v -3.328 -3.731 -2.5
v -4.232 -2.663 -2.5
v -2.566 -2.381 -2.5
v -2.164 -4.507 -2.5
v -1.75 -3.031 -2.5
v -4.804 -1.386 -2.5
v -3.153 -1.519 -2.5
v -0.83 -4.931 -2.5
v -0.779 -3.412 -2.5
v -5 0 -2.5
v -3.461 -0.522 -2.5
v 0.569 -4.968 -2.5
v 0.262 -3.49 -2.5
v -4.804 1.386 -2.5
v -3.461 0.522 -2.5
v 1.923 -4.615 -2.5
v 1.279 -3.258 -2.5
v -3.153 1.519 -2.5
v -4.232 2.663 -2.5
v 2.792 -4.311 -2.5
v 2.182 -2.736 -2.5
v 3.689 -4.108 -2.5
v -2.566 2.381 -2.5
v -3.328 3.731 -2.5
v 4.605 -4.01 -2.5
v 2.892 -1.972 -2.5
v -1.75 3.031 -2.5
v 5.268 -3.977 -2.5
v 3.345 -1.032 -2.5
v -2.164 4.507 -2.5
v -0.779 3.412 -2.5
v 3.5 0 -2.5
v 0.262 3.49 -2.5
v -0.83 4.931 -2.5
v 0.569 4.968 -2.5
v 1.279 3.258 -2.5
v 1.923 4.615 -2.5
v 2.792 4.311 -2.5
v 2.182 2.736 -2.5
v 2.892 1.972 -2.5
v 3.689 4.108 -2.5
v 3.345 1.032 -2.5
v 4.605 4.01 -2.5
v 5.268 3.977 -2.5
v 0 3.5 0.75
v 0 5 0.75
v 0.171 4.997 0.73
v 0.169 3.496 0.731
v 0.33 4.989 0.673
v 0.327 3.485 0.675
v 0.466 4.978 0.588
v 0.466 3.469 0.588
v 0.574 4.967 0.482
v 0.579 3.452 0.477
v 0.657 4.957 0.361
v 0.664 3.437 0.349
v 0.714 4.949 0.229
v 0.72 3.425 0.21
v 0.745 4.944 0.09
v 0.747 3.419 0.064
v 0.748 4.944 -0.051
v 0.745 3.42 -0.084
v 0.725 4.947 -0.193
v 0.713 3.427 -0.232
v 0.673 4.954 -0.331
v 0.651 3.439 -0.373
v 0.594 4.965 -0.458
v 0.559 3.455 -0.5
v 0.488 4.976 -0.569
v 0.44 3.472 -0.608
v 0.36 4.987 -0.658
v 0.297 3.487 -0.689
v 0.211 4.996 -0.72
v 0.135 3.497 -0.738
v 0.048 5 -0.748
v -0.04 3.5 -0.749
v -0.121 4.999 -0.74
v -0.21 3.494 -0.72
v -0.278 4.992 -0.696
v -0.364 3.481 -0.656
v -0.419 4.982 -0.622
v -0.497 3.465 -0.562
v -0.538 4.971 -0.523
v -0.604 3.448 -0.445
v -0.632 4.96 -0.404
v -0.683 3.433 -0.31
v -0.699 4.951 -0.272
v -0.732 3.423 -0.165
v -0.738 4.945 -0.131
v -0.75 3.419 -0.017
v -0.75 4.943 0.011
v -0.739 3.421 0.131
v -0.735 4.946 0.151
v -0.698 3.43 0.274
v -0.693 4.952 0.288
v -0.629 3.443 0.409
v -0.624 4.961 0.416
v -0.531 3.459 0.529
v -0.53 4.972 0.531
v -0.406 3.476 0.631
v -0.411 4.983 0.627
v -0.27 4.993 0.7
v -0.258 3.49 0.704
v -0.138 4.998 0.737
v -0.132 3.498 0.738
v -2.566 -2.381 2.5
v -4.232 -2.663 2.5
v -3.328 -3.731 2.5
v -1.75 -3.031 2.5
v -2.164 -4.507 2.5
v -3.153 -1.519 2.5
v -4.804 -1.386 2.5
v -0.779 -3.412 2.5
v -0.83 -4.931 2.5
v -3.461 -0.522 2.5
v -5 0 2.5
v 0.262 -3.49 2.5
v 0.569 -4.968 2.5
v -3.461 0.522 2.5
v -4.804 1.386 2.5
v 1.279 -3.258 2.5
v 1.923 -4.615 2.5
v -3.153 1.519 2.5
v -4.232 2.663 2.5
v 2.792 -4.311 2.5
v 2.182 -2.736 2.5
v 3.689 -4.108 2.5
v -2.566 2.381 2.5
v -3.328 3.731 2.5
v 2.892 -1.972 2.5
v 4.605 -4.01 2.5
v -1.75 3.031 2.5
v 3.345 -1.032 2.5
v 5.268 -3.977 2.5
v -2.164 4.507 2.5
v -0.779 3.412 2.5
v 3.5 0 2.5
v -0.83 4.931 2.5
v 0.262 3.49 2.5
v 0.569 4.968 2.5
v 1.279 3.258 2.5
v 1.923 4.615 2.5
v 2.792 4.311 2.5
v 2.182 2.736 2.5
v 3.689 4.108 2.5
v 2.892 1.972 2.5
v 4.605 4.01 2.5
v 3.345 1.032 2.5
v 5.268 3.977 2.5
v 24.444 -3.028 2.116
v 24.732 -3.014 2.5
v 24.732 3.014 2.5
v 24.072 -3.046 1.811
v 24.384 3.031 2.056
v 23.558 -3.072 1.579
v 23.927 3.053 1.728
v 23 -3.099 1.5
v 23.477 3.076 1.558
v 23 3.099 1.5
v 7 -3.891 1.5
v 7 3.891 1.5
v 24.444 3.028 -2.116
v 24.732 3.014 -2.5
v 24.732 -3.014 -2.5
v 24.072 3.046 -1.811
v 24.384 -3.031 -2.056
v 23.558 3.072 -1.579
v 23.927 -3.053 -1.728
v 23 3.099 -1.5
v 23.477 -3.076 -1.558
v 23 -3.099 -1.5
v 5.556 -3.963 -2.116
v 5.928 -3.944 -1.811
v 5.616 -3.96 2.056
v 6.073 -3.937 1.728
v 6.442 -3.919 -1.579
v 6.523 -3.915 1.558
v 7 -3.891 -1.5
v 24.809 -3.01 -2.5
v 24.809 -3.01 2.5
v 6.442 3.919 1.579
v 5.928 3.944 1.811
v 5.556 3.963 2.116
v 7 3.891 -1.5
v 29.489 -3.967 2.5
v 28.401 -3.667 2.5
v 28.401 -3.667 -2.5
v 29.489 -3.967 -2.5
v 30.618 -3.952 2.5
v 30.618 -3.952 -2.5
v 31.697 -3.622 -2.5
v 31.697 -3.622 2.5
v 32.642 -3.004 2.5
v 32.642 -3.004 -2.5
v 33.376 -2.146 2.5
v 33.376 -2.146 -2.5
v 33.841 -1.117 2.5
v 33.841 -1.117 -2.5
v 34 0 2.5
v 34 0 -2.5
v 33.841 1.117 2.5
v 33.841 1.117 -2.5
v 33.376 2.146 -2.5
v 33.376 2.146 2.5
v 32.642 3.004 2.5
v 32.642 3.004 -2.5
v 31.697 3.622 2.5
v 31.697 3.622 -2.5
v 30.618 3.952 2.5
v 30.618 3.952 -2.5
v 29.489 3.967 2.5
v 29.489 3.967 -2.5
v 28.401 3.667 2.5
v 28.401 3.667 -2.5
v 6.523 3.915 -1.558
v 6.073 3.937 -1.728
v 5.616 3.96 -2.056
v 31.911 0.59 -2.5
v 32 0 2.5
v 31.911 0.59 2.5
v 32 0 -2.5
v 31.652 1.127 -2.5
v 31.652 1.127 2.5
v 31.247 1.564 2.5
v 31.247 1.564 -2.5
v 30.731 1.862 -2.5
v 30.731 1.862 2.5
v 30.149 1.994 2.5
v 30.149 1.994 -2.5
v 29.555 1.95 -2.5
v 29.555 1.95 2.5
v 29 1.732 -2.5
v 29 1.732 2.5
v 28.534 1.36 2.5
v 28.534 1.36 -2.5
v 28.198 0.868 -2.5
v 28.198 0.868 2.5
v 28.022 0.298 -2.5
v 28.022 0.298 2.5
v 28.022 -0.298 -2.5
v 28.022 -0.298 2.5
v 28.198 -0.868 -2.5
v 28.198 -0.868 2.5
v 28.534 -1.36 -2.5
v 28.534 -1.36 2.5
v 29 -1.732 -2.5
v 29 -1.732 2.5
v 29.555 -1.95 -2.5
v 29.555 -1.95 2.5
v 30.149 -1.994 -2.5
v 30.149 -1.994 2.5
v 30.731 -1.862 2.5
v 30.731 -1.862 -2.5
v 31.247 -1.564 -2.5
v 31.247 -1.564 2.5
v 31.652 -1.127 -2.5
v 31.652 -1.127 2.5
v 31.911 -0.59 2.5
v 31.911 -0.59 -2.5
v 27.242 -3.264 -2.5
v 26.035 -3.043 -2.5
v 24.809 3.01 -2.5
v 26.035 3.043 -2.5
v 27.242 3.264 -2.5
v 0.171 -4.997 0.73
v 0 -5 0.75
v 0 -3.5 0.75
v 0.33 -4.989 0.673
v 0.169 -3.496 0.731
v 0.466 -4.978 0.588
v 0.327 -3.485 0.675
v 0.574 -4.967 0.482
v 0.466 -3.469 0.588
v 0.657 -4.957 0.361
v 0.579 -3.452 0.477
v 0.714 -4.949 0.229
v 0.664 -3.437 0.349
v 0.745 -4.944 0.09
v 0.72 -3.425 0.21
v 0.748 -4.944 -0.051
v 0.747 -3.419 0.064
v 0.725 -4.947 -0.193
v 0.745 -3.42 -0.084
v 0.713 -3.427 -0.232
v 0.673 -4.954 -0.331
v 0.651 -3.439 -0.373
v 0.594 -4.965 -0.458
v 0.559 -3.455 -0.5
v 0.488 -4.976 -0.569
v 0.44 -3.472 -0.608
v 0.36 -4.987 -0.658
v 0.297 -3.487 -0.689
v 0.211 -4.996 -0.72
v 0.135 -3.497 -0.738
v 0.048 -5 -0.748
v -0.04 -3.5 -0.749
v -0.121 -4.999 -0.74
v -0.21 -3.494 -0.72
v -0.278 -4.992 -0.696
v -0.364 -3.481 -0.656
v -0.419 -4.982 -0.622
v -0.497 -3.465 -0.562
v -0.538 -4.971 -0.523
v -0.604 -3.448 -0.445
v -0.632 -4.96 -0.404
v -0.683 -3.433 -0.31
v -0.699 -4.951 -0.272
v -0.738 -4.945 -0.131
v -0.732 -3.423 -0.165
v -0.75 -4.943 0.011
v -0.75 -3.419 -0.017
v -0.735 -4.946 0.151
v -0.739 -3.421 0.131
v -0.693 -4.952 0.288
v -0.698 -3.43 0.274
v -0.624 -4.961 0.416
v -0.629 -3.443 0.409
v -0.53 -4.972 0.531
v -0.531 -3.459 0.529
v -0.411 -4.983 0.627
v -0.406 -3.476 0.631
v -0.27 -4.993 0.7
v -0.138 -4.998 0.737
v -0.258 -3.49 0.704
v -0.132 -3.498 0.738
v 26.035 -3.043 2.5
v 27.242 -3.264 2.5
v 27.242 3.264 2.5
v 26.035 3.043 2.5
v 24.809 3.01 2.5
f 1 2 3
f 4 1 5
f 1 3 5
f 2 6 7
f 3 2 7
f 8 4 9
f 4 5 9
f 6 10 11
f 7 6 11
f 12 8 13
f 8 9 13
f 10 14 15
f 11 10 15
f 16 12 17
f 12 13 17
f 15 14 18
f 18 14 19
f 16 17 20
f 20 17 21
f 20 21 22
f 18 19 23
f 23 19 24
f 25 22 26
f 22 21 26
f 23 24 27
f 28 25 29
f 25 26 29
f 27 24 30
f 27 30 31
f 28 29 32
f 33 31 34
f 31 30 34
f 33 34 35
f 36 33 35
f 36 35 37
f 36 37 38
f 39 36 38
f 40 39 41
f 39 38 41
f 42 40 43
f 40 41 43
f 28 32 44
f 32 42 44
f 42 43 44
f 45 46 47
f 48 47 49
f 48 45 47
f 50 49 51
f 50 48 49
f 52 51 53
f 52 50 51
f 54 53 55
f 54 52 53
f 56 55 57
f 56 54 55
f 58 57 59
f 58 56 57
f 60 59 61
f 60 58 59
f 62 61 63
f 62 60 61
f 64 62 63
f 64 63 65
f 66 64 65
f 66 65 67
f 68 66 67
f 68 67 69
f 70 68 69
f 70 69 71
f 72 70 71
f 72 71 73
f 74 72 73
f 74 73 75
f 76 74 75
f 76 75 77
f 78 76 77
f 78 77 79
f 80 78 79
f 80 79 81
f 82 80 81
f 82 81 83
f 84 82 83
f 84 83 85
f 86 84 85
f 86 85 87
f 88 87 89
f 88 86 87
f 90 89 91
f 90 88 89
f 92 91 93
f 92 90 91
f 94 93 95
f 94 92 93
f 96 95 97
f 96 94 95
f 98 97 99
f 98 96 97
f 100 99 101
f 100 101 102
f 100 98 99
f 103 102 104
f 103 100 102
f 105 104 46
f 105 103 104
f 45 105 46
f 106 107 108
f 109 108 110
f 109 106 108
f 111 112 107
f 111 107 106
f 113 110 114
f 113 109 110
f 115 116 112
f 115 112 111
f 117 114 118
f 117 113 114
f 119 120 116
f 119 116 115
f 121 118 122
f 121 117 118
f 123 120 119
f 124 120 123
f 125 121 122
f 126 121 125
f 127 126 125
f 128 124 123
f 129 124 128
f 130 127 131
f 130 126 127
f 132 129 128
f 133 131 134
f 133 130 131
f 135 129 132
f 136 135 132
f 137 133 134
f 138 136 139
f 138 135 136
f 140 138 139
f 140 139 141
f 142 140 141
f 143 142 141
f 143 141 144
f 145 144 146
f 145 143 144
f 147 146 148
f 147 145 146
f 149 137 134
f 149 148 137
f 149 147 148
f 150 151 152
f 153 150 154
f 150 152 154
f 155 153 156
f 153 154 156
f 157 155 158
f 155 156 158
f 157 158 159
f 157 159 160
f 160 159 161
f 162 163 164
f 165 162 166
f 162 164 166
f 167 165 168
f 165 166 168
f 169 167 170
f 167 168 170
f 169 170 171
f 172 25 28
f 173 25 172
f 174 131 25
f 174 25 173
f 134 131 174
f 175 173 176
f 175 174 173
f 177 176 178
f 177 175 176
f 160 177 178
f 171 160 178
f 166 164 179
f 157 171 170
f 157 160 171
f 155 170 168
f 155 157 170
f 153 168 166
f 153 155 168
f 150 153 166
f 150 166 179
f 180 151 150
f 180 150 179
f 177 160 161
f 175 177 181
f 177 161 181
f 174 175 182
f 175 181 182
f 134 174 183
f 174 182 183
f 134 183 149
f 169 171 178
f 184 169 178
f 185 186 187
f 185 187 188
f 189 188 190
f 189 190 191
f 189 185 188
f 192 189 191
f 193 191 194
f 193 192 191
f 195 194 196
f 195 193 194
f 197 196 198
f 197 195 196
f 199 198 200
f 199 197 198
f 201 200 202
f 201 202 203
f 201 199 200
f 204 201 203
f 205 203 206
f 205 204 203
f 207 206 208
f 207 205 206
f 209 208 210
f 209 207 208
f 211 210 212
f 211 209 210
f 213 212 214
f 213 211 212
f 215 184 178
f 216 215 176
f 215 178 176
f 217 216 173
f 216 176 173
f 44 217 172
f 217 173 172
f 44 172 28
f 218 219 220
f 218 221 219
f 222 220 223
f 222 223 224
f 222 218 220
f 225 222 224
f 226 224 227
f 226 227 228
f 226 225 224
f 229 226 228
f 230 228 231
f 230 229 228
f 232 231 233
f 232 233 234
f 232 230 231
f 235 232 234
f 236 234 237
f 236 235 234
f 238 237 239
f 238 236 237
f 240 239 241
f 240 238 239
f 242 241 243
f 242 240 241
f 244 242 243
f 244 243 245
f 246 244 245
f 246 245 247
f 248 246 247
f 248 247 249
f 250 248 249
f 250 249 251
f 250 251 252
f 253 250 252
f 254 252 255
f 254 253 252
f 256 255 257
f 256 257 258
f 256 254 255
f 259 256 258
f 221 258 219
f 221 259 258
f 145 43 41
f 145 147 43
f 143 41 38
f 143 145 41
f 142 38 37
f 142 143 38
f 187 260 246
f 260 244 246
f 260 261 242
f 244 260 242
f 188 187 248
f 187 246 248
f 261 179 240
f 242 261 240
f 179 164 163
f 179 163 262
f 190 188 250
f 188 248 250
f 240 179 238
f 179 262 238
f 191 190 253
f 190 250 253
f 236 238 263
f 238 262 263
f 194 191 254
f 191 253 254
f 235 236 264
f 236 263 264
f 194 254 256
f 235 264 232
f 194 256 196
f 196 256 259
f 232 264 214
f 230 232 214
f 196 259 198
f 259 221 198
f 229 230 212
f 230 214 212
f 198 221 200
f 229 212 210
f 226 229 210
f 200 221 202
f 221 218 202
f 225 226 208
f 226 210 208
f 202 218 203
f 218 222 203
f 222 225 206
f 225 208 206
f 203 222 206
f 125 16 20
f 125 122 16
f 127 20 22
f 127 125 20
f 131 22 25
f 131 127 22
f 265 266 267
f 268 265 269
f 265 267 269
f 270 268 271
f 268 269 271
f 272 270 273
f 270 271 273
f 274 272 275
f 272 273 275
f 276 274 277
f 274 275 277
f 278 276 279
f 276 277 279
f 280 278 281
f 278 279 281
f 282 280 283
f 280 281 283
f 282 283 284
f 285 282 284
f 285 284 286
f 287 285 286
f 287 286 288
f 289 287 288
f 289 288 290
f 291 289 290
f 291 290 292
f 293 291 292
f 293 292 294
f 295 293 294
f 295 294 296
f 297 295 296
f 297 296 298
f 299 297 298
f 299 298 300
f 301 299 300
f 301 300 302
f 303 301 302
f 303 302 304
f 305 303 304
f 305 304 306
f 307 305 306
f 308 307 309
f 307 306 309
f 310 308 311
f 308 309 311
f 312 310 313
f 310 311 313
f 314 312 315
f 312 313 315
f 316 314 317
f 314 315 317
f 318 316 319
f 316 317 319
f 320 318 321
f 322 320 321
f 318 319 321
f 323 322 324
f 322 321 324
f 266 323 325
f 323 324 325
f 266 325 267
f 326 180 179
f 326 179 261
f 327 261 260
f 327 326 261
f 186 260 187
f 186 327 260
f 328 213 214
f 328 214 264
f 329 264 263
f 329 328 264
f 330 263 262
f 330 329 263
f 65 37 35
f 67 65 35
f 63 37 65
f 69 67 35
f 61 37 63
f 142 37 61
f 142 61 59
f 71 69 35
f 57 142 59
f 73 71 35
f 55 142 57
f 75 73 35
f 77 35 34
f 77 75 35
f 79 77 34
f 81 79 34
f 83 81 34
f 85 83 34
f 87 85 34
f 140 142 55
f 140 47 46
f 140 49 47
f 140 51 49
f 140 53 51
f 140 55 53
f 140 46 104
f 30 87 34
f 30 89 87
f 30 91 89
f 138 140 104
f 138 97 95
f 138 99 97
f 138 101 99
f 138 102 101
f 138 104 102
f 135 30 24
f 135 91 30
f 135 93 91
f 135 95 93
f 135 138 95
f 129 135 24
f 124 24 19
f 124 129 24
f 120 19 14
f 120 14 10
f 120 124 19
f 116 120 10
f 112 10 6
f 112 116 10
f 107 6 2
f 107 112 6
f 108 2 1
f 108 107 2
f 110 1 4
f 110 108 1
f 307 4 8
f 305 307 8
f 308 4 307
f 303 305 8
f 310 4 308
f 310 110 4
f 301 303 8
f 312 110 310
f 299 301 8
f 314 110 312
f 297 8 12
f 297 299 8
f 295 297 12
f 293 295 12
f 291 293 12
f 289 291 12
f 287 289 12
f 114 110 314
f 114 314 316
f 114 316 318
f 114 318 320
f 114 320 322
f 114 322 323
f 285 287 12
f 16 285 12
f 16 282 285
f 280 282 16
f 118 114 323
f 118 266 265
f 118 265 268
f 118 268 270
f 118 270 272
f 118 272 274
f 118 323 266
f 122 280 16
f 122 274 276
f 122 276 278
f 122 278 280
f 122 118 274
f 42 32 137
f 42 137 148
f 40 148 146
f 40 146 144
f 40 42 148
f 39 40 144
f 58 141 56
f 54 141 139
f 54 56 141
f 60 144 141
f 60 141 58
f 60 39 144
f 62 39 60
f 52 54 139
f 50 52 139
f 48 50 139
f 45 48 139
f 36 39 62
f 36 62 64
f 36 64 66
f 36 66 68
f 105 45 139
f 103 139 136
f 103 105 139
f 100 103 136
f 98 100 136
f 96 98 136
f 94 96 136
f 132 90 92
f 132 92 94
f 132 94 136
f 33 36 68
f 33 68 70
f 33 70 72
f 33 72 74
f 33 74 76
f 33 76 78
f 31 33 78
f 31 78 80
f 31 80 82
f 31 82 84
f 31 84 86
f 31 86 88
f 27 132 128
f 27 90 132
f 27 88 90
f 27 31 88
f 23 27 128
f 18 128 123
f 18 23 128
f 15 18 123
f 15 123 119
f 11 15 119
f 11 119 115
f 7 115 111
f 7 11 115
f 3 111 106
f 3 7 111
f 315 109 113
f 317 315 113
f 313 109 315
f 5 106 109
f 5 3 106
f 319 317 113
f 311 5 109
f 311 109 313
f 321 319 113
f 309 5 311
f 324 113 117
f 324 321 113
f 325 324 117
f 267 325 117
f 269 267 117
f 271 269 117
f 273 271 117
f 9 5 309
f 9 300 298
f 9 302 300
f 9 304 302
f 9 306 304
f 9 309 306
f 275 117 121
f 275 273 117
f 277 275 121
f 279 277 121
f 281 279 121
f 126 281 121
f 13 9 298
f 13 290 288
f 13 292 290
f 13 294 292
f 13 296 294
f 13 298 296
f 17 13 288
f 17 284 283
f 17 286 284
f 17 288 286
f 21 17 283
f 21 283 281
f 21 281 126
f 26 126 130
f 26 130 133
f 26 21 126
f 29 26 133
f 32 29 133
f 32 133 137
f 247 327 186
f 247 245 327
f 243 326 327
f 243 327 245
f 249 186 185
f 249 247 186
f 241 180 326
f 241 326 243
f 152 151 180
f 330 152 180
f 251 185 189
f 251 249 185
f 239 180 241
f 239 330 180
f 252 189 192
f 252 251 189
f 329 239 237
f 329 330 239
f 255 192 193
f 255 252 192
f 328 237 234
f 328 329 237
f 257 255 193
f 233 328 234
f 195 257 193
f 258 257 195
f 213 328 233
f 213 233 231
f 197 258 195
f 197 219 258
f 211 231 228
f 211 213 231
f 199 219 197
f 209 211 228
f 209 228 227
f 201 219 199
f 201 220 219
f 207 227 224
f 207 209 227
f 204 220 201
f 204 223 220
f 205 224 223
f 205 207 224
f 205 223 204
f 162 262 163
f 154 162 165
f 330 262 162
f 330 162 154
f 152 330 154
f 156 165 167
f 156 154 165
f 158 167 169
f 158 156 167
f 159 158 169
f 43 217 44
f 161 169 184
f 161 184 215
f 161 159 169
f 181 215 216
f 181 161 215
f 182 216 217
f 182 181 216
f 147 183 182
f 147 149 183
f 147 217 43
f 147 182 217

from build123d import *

# Parameters (mm, degrees)
ESQUISSE1_R             = 2
ESQUISSE1_R_2           = 3.5
BASE_EXTRUSION_DEPTH    = 2.5
ESQUISSE2_R             = 0.75
ENL_V_MAT_EXTRU_1_DEPTH = 10


with BuildPart() as part:
    # Esquisse1 → Base-Extrusion (new, symmetric)
    with BuildSketch(Plane.XY):
        with BuildLine():
            Line((4.604526211, -4.009780949), (24.808694688, -3.009780949))
            ThreePointArc((24.808694688, -3.009780949), (26.64302969, -3.130458818), (28.401389492, -3.666666667))
            ThreePointArc((28.401389492, -3.666666667), (34, 0), (28.401389492, 3.666666667))
            ThreePointArc((28.401389492, 3.666666667), (26.64302969, 3.130458818), (24.808694688, 3.009780949))
            Line((24.808694688, 3.009780949), (4.604526211, 4.009780949))
            ThreePointArc((4.604526211, 4.009780949), (3.237594273, 4.196543967), (1.923076923, 4.615384615))
            ThreePointArc((1.923076923, 4.615384615), (-5, 0), (1.923076923, -4.615384615))
            ThreePointArc((1.923076923, -4.615384615), (3.237594273, -4.196543967), (4.604526211, -4.009780949))
        make_face()
        with Locations((30, 0)):
            Circle(ESQUISSE1_R, mode=Mode.SUBTRACT)
        Circle(ESQUISSE1_R_2, mode=Mode.SUBTRACT)
    extrude(amount=BASE_EXTRUSION_DEPTH, both=True)

    # Esquisse2 → Enlèv. mat.-Extru.1 (cut, symmetric)
    with BuildSketch(Plane(origin=(0, 0, 0), x_dir=(1, 0, 0), z_dir=(0, 1, 0))):
        with Locations(Location((0, 0, 0), (0, 0, 270))):
            Circle(ESQUISSE2_R)
        with BuildLine():
            Line((5, 6.563022401), (25, 6.563022401))
            Line((25, 6.563022401), (25, 3.5))
            ThreePointArc((25, 3.5), (24.414213562, 2.085786438), (23, 1.5))
            Line((23, 1.5), (7, 1.5))
            ThreePointArc((7, 1.5), (5.585786438, 2.085786438), (5, 3.5))
            Line((5, 3.5), (5, 6.563022401))
        make_face()
        with BuildLine():
            Line((5, -5.954530257), (25, -5.954530257))
            Line((25, -5.954530257), (25, -3.5))
            ThreePointArc((25, -3.5), (24.414213562, -2.085786438), (23, -1.5))
            Line((23, -1.5), (7, -1.5))
            ThreePointArc((7, -1.5), (5.585786438, -2.085786438), (5, -3.5))
            Line((5, -3.5), (5, -5.954530257))
        make_face()
    extrude(amount=ENL_V_MAT_EXTRU_1_DEPTH, both=True, mode=Mode.SUBTRACT)


solid = part.part
